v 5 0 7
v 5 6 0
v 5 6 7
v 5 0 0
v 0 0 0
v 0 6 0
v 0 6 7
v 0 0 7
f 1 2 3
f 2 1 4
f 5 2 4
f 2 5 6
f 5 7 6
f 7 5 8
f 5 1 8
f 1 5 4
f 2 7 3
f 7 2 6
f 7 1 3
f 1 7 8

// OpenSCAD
translate([2.5, 1.0, 1.5]) color([0.8599943994333726, 0.2546391746557106, 0.34394037628155716]) cube([5, 2, 3], center=true);
translate([2.5, 3.0, 1.5]) color([0.712480390369609, 0.04450290132920964, 0.934183460116191]) cube([5, 2, 3], center=true);
translate([2.5, 5.0, 1.5]) color([0.07233773178762537, 0.4609310589380602, 0.7246048259600892]) cube([5, 2, 3], center=true);
translate([2.5, 1.5, 4.0]) color([0.04746853498479808, 0.8090026856371774, 0.9788933433114139]) cube([5, 3, 2], center=true);
translate([2.5, 4.5, 4.0]) color([0.460511672795628, 0.11812363628756806, 0.08147699565547994]) cube([5, 3, 2], center=true);
translate([2.5, 1.5, 6.0]) color([0.09873043616313526, 0.7654413741364753, 0.4140128484685186]) cube([5, 3, 2], center=true);
translate([2.5, 4.5, 6.0]) color([0.9192341581990311, 0.4406397760864845, 0.07714331014460807]) cube([5, 3, 2], center=true);
